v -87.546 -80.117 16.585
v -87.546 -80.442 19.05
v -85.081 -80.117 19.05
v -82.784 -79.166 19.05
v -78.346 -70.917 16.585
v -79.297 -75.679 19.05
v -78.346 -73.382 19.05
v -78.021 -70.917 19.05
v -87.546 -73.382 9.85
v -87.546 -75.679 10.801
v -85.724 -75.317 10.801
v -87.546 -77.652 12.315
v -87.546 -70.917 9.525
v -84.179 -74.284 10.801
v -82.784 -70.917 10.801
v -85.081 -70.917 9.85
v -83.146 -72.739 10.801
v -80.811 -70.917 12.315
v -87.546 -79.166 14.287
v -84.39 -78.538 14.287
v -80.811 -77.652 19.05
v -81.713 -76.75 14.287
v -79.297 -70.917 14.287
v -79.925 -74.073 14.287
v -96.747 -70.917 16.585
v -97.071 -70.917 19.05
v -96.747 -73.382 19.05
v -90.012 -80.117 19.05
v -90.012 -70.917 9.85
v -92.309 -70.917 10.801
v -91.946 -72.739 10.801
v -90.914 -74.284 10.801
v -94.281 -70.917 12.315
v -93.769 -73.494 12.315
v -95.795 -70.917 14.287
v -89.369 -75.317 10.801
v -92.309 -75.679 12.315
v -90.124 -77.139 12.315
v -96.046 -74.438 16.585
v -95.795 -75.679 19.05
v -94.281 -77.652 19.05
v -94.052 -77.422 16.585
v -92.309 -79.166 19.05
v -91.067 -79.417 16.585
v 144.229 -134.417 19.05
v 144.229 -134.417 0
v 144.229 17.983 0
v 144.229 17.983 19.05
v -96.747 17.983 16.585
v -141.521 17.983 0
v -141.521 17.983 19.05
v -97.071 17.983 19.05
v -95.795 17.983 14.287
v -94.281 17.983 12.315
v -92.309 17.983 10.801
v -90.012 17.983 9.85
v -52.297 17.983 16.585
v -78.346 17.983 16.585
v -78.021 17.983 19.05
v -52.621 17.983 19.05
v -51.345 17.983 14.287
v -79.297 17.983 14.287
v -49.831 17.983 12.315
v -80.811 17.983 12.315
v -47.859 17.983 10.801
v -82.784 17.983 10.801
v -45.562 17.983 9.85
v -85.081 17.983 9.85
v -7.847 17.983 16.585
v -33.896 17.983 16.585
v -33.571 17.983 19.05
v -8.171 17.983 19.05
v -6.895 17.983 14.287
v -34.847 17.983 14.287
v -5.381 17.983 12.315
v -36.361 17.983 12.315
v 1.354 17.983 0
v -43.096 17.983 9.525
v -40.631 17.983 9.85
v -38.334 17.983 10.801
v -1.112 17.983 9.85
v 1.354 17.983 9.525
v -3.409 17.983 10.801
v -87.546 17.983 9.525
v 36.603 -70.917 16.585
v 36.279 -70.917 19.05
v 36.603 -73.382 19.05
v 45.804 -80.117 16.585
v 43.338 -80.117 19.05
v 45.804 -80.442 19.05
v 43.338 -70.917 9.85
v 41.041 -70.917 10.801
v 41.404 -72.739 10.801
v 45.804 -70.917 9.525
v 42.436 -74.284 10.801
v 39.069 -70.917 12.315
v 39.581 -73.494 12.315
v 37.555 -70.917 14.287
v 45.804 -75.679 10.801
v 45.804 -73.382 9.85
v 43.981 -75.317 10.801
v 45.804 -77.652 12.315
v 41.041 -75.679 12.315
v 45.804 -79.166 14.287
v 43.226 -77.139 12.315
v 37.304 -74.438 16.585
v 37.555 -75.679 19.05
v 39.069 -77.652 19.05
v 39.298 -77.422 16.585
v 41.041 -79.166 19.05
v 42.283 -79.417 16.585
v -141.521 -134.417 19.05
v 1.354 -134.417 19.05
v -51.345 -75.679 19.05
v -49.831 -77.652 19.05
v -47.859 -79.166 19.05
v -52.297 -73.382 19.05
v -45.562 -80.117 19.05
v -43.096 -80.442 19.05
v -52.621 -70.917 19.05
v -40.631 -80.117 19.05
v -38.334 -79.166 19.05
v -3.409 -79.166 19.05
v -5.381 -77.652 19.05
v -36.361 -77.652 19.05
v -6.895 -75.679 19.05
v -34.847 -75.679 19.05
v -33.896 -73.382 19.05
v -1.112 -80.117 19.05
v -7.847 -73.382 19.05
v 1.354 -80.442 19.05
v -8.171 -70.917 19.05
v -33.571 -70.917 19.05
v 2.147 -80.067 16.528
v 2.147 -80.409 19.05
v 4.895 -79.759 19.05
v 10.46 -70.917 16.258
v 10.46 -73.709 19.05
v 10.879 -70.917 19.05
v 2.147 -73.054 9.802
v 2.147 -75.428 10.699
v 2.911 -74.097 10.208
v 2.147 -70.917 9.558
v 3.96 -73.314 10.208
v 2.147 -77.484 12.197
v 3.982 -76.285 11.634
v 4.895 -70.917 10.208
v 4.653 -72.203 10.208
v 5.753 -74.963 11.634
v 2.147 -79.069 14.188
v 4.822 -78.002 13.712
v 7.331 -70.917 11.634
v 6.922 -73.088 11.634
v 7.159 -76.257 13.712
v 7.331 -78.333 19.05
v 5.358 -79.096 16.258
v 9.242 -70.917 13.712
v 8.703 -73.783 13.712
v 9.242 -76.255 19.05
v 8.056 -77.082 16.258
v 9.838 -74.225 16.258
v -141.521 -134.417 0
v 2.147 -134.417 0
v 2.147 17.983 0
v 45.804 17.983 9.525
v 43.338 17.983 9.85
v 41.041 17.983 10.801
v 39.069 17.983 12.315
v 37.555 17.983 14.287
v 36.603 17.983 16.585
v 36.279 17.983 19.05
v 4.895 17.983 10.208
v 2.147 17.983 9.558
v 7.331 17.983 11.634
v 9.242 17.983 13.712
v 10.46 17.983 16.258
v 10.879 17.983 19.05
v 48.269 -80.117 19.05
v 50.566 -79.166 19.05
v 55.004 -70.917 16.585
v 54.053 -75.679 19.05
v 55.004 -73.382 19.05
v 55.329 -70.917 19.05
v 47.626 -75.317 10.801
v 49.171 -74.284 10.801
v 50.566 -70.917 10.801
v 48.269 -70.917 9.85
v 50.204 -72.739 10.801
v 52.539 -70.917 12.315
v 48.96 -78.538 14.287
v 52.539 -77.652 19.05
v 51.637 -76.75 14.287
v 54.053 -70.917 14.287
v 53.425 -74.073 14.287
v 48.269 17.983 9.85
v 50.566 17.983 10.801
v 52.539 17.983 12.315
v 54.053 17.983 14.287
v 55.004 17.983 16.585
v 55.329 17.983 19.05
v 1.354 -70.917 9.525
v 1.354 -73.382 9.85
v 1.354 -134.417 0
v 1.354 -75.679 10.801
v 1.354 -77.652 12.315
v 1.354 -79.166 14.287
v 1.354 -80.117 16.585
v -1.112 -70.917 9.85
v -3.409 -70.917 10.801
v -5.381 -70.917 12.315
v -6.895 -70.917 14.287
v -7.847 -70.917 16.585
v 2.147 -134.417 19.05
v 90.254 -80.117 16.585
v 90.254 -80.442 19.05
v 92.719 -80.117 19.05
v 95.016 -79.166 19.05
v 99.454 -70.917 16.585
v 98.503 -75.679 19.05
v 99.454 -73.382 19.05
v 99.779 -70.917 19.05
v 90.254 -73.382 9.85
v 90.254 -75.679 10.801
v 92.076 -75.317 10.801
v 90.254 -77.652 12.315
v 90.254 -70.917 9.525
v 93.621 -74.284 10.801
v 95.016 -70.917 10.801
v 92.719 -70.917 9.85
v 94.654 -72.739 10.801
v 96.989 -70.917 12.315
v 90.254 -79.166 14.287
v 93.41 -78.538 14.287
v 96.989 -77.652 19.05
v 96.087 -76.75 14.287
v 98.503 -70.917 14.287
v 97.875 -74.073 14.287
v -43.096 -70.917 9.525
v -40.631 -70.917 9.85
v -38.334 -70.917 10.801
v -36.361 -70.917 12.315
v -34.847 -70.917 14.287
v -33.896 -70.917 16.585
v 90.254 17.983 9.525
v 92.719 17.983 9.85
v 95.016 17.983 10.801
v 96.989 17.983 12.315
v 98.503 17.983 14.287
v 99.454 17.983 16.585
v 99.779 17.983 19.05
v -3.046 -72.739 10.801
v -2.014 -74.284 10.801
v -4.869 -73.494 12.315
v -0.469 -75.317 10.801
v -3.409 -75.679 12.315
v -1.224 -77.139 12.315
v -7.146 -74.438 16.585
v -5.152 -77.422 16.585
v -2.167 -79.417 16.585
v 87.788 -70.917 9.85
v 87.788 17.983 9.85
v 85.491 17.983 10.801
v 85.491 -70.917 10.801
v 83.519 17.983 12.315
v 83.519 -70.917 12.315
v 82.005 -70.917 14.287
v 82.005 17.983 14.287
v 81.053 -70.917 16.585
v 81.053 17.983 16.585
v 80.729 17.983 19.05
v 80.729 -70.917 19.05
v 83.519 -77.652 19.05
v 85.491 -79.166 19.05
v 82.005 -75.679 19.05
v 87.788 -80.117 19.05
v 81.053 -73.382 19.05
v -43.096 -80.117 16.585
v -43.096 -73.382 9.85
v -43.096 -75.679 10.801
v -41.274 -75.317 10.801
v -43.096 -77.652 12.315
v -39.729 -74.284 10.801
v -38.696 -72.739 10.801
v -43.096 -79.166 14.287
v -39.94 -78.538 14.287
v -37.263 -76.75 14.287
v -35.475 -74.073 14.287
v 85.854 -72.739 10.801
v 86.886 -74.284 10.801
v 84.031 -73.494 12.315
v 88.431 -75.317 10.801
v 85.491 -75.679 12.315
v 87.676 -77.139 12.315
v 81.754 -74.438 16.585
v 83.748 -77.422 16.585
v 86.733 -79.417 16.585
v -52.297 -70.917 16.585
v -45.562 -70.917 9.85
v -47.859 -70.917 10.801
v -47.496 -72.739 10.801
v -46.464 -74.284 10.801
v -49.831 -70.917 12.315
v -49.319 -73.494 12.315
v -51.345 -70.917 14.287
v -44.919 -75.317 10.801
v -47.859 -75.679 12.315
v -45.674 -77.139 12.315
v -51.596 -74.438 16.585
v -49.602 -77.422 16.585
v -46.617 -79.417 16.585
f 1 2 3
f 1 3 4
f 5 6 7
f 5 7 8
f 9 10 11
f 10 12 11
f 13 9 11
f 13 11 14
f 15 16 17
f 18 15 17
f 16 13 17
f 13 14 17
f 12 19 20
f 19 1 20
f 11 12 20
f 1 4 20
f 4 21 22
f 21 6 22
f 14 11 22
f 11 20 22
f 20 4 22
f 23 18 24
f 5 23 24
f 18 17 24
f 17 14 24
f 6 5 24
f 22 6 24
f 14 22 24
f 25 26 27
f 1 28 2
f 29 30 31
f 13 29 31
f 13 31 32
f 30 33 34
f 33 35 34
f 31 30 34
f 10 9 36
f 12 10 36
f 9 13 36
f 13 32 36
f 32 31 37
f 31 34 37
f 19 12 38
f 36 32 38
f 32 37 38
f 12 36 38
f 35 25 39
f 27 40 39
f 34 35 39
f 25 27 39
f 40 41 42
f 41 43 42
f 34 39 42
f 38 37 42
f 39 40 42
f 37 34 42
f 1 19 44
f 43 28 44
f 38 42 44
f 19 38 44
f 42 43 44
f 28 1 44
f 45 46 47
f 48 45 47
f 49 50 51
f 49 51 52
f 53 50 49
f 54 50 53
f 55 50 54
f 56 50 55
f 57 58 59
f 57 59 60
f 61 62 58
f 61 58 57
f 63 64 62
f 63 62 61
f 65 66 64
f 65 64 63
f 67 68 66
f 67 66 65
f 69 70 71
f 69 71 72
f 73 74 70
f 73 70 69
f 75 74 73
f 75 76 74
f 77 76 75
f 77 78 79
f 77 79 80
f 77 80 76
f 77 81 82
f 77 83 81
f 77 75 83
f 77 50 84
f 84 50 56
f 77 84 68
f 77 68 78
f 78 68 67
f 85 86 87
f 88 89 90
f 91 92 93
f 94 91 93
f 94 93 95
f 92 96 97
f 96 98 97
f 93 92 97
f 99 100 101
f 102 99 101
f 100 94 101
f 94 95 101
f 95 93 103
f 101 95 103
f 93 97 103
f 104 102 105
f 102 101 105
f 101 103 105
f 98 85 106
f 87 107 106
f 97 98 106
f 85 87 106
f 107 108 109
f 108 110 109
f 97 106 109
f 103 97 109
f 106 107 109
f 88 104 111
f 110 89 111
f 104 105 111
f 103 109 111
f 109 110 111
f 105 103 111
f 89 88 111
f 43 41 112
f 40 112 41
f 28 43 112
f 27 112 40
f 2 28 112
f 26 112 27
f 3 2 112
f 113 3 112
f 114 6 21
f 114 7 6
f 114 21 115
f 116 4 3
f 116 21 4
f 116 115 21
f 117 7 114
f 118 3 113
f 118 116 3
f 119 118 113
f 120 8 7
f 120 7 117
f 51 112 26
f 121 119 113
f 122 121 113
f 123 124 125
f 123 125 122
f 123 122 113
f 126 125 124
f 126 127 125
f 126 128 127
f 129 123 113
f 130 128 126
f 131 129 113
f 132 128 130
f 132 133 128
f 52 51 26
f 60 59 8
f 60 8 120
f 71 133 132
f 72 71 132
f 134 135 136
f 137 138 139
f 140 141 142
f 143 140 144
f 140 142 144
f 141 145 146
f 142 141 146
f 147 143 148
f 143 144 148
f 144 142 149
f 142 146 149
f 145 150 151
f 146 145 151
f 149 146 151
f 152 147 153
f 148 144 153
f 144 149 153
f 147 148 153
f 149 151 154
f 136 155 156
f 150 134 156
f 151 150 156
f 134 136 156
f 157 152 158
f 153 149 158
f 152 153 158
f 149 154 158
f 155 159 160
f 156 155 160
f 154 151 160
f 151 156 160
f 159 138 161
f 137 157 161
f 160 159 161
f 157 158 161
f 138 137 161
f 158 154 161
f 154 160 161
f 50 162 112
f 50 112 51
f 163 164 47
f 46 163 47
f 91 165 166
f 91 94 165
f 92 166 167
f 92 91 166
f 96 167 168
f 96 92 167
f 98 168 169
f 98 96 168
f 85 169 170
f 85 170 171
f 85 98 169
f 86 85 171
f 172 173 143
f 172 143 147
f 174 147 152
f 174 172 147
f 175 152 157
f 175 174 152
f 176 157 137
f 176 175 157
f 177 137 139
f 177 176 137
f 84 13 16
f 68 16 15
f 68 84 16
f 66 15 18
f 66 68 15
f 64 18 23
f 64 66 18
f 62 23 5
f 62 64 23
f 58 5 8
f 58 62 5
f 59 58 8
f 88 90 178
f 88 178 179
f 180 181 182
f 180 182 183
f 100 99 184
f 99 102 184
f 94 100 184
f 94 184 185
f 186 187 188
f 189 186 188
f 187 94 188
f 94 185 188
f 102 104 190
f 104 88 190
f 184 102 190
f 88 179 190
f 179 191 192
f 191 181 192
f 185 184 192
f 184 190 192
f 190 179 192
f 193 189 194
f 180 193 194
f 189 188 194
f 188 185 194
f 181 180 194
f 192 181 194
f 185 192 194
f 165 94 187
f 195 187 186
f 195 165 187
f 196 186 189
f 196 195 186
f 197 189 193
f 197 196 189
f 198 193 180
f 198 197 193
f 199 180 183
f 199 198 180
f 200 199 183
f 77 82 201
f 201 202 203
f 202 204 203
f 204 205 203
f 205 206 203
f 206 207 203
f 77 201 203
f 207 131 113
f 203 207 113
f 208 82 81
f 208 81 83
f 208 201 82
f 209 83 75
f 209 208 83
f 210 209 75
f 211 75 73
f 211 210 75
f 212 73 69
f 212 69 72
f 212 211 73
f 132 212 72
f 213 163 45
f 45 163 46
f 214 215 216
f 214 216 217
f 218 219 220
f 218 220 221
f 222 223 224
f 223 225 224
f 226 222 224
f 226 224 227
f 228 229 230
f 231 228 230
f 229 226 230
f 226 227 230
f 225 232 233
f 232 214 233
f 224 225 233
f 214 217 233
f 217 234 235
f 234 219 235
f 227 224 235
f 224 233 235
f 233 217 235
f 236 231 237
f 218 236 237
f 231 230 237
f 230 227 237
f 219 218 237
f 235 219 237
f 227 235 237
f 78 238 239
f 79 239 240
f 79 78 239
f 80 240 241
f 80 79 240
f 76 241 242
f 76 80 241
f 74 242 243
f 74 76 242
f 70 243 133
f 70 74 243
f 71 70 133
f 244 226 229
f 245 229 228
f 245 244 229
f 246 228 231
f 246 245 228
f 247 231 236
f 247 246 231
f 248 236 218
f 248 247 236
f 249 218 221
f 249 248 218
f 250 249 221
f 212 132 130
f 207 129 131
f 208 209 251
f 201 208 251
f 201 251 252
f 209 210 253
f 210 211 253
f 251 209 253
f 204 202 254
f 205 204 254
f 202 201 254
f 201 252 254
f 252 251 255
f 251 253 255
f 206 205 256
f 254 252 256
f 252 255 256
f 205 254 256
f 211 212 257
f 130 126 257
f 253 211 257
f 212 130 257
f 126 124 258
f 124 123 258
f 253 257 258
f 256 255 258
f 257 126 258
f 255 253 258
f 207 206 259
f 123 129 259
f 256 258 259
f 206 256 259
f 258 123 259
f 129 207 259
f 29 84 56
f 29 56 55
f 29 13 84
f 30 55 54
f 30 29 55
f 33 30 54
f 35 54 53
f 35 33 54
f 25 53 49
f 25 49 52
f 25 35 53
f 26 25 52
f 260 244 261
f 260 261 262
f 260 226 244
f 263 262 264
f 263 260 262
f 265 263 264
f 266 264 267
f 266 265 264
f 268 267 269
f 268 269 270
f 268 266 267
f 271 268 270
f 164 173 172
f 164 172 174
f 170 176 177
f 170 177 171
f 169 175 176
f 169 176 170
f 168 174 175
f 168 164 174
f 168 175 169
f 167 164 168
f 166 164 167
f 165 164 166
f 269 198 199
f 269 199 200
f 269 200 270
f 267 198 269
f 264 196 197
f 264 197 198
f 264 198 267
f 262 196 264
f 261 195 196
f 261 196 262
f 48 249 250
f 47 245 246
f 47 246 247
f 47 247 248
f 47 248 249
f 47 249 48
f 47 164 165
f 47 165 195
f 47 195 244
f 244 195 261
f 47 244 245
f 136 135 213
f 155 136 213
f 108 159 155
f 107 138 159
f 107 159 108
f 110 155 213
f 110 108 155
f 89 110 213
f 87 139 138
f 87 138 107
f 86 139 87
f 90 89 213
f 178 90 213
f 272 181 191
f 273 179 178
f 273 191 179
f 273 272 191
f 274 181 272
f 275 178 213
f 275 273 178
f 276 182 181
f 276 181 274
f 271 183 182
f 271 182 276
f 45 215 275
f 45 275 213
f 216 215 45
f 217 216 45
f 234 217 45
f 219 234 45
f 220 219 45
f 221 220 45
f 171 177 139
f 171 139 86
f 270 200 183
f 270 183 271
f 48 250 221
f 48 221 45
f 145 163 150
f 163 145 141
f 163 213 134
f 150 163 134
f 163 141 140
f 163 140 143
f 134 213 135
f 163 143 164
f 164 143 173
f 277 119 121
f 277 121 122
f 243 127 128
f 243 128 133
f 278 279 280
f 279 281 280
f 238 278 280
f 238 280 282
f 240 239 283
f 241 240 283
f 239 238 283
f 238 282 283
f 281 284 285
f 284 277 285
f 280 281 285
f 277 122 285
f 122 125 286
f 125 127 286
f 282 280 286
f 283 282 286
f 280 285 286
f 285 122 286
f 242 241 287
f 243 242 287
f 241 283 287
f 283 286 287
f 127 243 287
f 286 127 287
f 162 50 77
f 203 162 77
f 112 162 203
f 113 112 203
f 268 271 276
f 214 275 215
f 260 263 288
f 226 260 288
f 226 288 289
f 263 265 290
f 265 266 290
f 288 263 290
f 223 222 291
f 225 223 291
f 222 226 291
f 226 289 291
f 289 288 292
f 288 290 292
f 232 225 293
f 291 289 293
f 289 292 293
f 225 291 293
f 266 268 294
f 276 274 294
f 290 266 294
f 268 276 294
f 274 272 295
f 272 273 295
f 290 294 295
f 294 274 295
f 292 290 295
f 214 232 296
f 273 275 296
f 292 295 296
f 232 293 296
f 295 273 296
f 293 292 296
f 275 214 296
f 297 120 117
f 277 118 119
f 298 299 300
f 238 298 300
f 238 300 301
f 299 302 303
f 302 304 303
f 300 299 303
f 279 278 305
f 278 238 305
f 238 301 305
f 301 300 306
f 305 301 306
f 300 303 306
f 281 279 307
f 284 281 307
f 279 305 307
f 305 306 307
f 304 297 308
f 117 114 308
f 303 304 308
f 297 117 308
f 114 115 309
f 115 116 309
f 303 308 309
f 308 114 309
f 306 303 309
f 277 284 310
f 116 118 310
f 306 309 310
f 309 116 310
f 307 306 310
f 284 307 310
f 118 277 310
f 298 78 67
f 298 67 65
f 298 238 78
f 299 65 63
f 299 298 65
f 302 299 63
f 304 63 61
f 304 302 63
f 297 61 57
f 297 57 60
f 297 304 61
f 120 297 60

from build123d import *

# Parameters (mm, degrees)
F0_W     = 285.75
F0_H     = 152.4
F1_DEPTH = 19.05
F3_DEPTH = 9.525
F4_R     = 9.52499
F6_DEPTH = 25.4


# Not quite as in the source:
# - a fillet or chamfer is up to 0.001 mm smaller than in the source, because OpenCascade refuses the exact size


with BuildPart() as f1:
    # F0 (on Top) → F1 (new body)
    with BuildSketch(Plane.XY):
        with Locations((1.3537015766, -58.2166751785)):
            Rectangle(F0_W, F0_H)
    extrude(amount=F1_DEPTH)

    # F2 (on face) → F3 (cut)
    with BuildSketch(Plane.XY.offset(19.05)):
        with BuildLine():
            Line((-78.0212984234, 17.9833248215), (-97.0712984234, 17.9833248215))
            Line((-97.0712984234, 17.9833248215), (-97.0712984234, -70.9166751785))
            ThreePointArc((-97.0712984234, -70.9166751785), (-94.2814905142, -77.6518672693), (-87.5462984234, -80.4416751785))
            ThreePointArc((-87.5462984234, -80.4416751785), (-80.8111063326, -77.6518672693), (-78.0212984234, -70.9166751785))
            Line((-78.0212984234, -70.9166751785), (-78.0212984234, 17.9833248215))
        make_face()
        with BuildLine():
            Line((-33.5712984234, 17.9833248215), (-52.6212984234, 17.9833248215))
            Line((-52.6212984234, 17.9833248215), (-52.6212984234, -70.9166751785))
            ThreePointArc((-52.6212984234, -70.9166751785), (-49.8314905142, -77.6518672693), (-43.0962984234, -80.4416751785))
            ThreePointArc((-43.0962984234, -80.4416751785), (-36.3611063326, -77.6518672693), (-33.5712984234, -70.9166751785))
            Line((-33.5712984234, -70.9166751785), (-33.5712984234, 17.9833248215))
        make_face()
        with BuildLine():
            Line((10.8787015766, 17.9833248215), (-8.1712984234, 17.9833248215))
            Line((-8.1712984234, 17.9833248215), (-8.1712984234, -70.9166751785))
            ThreePointArc((-8.1712984234, -70.9166751785), (-5.3814905142, -77.6518672693), (1.3537015766, -80.4416751785))
            ThreePointArc((1.3537015766, -80.4416751785), (8.0888936674, -77.6518672693), (10.8787015766, -70.9166751785))
            Line((10.8787015766, -70.9166751785), (10.8787015766, 17.9833248215))
        make_face()
        with BuildLine():
            Line((55.3287015766, 17.9833248215), (36.2787015766, 17.9833248215))
            Line((36.2787015766, 17.9833248215), (36.2787015766, -70.9166751785))
            ThreePointArc((36.2787015766, -70.9166751785), (39.0685094858, -77.6518672693), (45.8037015766, -80.4416751785))
            ThreePointArc((45.8037015766, -80.4416751785), (52.5388936674, -77.6518672693), (55.3287015766, -70.9166751785))
            Line((55.3287015766, -70.9166751785), (55.3287015766, 17.9833248215))
        make_face()
        with BuildLine():
            Line((99.7787015766, -70.9166751785), (99.7787015766, 17.9833248215))
            Line((99.7787015766, 17.9833248215), (80.7287015766, 17.9833248215))
            Line((80.7287015766, 17.9833248215), (80.7287015766, -70.9166751785))
            ThreePointArc((80.7287015766, -70.9166751785), (83.5185094858, -77.6518672693), (90.2537015766, -80.4416751785))
            ThreePointArc((90.2537015766, -80.4416751785), (96.9888936674, -77.6518672693), (99.7787015766, -70.9166751785))
        make_face()
    extrude(amount=-F3_DEPTH, mode=Mode.SUBTRACT)

    # F4 (radius 9.525 in the source; OpenCascade refuses exactly that, so slightly less here)
    f4_edges = [f1.edges().sort_by_distance(p)[0] for p in [
        (-87.546298, -80.441675, 9.525),
        (-52.621298, -26.466675, 9.525),
        (-8.171298, -26.466675, 9.525),
        (36.278702, -26.466675, 9.525),
        (80.728702, -26.466675, 9.525),
    ]]
    fillet(f4_edges, radius=F4_R)

    # F5 (on face) → F6 (cut)
    with BuildSketch(Plane.XY.offset(19.05)):
        with BuildLine():
            Line((1.3537015766, 17.9833248215), (1.3537015766, -80.4416751785))
            ThreePointArc((1.3537015766, -80.4416751785), (1.7509221371, -80.4333889404), (2.1474515766, -80.4085446434))
            Line((2.1474515766, -80.4085446434), (2.1474515766, 17.9833248215))
            Line((2.1474515766, 17.9833248215), (1.3537015766, 17.9833248215))
        make_face()
        with BuildLine():
            Line((1.3537015766, -80.4416751785), (1.3537015766, -134.4166751785))
            Line((1.3537015766, -134.4166751785), (2.1474515766, -134.4166751785))
            Line((2.1474515766, -134.4166751785), (2.1474515766, -80.4085446434))
            ThreePointArc((2.1474515766, -80.4085446434), (1.7509221371, -80.4333889404), (1.3537015766, -80.4416751785))
        make_face()
    extrude(amount=-F6_DEPTH, mode=Mode.SUBTRACT)


solid = f1.part
